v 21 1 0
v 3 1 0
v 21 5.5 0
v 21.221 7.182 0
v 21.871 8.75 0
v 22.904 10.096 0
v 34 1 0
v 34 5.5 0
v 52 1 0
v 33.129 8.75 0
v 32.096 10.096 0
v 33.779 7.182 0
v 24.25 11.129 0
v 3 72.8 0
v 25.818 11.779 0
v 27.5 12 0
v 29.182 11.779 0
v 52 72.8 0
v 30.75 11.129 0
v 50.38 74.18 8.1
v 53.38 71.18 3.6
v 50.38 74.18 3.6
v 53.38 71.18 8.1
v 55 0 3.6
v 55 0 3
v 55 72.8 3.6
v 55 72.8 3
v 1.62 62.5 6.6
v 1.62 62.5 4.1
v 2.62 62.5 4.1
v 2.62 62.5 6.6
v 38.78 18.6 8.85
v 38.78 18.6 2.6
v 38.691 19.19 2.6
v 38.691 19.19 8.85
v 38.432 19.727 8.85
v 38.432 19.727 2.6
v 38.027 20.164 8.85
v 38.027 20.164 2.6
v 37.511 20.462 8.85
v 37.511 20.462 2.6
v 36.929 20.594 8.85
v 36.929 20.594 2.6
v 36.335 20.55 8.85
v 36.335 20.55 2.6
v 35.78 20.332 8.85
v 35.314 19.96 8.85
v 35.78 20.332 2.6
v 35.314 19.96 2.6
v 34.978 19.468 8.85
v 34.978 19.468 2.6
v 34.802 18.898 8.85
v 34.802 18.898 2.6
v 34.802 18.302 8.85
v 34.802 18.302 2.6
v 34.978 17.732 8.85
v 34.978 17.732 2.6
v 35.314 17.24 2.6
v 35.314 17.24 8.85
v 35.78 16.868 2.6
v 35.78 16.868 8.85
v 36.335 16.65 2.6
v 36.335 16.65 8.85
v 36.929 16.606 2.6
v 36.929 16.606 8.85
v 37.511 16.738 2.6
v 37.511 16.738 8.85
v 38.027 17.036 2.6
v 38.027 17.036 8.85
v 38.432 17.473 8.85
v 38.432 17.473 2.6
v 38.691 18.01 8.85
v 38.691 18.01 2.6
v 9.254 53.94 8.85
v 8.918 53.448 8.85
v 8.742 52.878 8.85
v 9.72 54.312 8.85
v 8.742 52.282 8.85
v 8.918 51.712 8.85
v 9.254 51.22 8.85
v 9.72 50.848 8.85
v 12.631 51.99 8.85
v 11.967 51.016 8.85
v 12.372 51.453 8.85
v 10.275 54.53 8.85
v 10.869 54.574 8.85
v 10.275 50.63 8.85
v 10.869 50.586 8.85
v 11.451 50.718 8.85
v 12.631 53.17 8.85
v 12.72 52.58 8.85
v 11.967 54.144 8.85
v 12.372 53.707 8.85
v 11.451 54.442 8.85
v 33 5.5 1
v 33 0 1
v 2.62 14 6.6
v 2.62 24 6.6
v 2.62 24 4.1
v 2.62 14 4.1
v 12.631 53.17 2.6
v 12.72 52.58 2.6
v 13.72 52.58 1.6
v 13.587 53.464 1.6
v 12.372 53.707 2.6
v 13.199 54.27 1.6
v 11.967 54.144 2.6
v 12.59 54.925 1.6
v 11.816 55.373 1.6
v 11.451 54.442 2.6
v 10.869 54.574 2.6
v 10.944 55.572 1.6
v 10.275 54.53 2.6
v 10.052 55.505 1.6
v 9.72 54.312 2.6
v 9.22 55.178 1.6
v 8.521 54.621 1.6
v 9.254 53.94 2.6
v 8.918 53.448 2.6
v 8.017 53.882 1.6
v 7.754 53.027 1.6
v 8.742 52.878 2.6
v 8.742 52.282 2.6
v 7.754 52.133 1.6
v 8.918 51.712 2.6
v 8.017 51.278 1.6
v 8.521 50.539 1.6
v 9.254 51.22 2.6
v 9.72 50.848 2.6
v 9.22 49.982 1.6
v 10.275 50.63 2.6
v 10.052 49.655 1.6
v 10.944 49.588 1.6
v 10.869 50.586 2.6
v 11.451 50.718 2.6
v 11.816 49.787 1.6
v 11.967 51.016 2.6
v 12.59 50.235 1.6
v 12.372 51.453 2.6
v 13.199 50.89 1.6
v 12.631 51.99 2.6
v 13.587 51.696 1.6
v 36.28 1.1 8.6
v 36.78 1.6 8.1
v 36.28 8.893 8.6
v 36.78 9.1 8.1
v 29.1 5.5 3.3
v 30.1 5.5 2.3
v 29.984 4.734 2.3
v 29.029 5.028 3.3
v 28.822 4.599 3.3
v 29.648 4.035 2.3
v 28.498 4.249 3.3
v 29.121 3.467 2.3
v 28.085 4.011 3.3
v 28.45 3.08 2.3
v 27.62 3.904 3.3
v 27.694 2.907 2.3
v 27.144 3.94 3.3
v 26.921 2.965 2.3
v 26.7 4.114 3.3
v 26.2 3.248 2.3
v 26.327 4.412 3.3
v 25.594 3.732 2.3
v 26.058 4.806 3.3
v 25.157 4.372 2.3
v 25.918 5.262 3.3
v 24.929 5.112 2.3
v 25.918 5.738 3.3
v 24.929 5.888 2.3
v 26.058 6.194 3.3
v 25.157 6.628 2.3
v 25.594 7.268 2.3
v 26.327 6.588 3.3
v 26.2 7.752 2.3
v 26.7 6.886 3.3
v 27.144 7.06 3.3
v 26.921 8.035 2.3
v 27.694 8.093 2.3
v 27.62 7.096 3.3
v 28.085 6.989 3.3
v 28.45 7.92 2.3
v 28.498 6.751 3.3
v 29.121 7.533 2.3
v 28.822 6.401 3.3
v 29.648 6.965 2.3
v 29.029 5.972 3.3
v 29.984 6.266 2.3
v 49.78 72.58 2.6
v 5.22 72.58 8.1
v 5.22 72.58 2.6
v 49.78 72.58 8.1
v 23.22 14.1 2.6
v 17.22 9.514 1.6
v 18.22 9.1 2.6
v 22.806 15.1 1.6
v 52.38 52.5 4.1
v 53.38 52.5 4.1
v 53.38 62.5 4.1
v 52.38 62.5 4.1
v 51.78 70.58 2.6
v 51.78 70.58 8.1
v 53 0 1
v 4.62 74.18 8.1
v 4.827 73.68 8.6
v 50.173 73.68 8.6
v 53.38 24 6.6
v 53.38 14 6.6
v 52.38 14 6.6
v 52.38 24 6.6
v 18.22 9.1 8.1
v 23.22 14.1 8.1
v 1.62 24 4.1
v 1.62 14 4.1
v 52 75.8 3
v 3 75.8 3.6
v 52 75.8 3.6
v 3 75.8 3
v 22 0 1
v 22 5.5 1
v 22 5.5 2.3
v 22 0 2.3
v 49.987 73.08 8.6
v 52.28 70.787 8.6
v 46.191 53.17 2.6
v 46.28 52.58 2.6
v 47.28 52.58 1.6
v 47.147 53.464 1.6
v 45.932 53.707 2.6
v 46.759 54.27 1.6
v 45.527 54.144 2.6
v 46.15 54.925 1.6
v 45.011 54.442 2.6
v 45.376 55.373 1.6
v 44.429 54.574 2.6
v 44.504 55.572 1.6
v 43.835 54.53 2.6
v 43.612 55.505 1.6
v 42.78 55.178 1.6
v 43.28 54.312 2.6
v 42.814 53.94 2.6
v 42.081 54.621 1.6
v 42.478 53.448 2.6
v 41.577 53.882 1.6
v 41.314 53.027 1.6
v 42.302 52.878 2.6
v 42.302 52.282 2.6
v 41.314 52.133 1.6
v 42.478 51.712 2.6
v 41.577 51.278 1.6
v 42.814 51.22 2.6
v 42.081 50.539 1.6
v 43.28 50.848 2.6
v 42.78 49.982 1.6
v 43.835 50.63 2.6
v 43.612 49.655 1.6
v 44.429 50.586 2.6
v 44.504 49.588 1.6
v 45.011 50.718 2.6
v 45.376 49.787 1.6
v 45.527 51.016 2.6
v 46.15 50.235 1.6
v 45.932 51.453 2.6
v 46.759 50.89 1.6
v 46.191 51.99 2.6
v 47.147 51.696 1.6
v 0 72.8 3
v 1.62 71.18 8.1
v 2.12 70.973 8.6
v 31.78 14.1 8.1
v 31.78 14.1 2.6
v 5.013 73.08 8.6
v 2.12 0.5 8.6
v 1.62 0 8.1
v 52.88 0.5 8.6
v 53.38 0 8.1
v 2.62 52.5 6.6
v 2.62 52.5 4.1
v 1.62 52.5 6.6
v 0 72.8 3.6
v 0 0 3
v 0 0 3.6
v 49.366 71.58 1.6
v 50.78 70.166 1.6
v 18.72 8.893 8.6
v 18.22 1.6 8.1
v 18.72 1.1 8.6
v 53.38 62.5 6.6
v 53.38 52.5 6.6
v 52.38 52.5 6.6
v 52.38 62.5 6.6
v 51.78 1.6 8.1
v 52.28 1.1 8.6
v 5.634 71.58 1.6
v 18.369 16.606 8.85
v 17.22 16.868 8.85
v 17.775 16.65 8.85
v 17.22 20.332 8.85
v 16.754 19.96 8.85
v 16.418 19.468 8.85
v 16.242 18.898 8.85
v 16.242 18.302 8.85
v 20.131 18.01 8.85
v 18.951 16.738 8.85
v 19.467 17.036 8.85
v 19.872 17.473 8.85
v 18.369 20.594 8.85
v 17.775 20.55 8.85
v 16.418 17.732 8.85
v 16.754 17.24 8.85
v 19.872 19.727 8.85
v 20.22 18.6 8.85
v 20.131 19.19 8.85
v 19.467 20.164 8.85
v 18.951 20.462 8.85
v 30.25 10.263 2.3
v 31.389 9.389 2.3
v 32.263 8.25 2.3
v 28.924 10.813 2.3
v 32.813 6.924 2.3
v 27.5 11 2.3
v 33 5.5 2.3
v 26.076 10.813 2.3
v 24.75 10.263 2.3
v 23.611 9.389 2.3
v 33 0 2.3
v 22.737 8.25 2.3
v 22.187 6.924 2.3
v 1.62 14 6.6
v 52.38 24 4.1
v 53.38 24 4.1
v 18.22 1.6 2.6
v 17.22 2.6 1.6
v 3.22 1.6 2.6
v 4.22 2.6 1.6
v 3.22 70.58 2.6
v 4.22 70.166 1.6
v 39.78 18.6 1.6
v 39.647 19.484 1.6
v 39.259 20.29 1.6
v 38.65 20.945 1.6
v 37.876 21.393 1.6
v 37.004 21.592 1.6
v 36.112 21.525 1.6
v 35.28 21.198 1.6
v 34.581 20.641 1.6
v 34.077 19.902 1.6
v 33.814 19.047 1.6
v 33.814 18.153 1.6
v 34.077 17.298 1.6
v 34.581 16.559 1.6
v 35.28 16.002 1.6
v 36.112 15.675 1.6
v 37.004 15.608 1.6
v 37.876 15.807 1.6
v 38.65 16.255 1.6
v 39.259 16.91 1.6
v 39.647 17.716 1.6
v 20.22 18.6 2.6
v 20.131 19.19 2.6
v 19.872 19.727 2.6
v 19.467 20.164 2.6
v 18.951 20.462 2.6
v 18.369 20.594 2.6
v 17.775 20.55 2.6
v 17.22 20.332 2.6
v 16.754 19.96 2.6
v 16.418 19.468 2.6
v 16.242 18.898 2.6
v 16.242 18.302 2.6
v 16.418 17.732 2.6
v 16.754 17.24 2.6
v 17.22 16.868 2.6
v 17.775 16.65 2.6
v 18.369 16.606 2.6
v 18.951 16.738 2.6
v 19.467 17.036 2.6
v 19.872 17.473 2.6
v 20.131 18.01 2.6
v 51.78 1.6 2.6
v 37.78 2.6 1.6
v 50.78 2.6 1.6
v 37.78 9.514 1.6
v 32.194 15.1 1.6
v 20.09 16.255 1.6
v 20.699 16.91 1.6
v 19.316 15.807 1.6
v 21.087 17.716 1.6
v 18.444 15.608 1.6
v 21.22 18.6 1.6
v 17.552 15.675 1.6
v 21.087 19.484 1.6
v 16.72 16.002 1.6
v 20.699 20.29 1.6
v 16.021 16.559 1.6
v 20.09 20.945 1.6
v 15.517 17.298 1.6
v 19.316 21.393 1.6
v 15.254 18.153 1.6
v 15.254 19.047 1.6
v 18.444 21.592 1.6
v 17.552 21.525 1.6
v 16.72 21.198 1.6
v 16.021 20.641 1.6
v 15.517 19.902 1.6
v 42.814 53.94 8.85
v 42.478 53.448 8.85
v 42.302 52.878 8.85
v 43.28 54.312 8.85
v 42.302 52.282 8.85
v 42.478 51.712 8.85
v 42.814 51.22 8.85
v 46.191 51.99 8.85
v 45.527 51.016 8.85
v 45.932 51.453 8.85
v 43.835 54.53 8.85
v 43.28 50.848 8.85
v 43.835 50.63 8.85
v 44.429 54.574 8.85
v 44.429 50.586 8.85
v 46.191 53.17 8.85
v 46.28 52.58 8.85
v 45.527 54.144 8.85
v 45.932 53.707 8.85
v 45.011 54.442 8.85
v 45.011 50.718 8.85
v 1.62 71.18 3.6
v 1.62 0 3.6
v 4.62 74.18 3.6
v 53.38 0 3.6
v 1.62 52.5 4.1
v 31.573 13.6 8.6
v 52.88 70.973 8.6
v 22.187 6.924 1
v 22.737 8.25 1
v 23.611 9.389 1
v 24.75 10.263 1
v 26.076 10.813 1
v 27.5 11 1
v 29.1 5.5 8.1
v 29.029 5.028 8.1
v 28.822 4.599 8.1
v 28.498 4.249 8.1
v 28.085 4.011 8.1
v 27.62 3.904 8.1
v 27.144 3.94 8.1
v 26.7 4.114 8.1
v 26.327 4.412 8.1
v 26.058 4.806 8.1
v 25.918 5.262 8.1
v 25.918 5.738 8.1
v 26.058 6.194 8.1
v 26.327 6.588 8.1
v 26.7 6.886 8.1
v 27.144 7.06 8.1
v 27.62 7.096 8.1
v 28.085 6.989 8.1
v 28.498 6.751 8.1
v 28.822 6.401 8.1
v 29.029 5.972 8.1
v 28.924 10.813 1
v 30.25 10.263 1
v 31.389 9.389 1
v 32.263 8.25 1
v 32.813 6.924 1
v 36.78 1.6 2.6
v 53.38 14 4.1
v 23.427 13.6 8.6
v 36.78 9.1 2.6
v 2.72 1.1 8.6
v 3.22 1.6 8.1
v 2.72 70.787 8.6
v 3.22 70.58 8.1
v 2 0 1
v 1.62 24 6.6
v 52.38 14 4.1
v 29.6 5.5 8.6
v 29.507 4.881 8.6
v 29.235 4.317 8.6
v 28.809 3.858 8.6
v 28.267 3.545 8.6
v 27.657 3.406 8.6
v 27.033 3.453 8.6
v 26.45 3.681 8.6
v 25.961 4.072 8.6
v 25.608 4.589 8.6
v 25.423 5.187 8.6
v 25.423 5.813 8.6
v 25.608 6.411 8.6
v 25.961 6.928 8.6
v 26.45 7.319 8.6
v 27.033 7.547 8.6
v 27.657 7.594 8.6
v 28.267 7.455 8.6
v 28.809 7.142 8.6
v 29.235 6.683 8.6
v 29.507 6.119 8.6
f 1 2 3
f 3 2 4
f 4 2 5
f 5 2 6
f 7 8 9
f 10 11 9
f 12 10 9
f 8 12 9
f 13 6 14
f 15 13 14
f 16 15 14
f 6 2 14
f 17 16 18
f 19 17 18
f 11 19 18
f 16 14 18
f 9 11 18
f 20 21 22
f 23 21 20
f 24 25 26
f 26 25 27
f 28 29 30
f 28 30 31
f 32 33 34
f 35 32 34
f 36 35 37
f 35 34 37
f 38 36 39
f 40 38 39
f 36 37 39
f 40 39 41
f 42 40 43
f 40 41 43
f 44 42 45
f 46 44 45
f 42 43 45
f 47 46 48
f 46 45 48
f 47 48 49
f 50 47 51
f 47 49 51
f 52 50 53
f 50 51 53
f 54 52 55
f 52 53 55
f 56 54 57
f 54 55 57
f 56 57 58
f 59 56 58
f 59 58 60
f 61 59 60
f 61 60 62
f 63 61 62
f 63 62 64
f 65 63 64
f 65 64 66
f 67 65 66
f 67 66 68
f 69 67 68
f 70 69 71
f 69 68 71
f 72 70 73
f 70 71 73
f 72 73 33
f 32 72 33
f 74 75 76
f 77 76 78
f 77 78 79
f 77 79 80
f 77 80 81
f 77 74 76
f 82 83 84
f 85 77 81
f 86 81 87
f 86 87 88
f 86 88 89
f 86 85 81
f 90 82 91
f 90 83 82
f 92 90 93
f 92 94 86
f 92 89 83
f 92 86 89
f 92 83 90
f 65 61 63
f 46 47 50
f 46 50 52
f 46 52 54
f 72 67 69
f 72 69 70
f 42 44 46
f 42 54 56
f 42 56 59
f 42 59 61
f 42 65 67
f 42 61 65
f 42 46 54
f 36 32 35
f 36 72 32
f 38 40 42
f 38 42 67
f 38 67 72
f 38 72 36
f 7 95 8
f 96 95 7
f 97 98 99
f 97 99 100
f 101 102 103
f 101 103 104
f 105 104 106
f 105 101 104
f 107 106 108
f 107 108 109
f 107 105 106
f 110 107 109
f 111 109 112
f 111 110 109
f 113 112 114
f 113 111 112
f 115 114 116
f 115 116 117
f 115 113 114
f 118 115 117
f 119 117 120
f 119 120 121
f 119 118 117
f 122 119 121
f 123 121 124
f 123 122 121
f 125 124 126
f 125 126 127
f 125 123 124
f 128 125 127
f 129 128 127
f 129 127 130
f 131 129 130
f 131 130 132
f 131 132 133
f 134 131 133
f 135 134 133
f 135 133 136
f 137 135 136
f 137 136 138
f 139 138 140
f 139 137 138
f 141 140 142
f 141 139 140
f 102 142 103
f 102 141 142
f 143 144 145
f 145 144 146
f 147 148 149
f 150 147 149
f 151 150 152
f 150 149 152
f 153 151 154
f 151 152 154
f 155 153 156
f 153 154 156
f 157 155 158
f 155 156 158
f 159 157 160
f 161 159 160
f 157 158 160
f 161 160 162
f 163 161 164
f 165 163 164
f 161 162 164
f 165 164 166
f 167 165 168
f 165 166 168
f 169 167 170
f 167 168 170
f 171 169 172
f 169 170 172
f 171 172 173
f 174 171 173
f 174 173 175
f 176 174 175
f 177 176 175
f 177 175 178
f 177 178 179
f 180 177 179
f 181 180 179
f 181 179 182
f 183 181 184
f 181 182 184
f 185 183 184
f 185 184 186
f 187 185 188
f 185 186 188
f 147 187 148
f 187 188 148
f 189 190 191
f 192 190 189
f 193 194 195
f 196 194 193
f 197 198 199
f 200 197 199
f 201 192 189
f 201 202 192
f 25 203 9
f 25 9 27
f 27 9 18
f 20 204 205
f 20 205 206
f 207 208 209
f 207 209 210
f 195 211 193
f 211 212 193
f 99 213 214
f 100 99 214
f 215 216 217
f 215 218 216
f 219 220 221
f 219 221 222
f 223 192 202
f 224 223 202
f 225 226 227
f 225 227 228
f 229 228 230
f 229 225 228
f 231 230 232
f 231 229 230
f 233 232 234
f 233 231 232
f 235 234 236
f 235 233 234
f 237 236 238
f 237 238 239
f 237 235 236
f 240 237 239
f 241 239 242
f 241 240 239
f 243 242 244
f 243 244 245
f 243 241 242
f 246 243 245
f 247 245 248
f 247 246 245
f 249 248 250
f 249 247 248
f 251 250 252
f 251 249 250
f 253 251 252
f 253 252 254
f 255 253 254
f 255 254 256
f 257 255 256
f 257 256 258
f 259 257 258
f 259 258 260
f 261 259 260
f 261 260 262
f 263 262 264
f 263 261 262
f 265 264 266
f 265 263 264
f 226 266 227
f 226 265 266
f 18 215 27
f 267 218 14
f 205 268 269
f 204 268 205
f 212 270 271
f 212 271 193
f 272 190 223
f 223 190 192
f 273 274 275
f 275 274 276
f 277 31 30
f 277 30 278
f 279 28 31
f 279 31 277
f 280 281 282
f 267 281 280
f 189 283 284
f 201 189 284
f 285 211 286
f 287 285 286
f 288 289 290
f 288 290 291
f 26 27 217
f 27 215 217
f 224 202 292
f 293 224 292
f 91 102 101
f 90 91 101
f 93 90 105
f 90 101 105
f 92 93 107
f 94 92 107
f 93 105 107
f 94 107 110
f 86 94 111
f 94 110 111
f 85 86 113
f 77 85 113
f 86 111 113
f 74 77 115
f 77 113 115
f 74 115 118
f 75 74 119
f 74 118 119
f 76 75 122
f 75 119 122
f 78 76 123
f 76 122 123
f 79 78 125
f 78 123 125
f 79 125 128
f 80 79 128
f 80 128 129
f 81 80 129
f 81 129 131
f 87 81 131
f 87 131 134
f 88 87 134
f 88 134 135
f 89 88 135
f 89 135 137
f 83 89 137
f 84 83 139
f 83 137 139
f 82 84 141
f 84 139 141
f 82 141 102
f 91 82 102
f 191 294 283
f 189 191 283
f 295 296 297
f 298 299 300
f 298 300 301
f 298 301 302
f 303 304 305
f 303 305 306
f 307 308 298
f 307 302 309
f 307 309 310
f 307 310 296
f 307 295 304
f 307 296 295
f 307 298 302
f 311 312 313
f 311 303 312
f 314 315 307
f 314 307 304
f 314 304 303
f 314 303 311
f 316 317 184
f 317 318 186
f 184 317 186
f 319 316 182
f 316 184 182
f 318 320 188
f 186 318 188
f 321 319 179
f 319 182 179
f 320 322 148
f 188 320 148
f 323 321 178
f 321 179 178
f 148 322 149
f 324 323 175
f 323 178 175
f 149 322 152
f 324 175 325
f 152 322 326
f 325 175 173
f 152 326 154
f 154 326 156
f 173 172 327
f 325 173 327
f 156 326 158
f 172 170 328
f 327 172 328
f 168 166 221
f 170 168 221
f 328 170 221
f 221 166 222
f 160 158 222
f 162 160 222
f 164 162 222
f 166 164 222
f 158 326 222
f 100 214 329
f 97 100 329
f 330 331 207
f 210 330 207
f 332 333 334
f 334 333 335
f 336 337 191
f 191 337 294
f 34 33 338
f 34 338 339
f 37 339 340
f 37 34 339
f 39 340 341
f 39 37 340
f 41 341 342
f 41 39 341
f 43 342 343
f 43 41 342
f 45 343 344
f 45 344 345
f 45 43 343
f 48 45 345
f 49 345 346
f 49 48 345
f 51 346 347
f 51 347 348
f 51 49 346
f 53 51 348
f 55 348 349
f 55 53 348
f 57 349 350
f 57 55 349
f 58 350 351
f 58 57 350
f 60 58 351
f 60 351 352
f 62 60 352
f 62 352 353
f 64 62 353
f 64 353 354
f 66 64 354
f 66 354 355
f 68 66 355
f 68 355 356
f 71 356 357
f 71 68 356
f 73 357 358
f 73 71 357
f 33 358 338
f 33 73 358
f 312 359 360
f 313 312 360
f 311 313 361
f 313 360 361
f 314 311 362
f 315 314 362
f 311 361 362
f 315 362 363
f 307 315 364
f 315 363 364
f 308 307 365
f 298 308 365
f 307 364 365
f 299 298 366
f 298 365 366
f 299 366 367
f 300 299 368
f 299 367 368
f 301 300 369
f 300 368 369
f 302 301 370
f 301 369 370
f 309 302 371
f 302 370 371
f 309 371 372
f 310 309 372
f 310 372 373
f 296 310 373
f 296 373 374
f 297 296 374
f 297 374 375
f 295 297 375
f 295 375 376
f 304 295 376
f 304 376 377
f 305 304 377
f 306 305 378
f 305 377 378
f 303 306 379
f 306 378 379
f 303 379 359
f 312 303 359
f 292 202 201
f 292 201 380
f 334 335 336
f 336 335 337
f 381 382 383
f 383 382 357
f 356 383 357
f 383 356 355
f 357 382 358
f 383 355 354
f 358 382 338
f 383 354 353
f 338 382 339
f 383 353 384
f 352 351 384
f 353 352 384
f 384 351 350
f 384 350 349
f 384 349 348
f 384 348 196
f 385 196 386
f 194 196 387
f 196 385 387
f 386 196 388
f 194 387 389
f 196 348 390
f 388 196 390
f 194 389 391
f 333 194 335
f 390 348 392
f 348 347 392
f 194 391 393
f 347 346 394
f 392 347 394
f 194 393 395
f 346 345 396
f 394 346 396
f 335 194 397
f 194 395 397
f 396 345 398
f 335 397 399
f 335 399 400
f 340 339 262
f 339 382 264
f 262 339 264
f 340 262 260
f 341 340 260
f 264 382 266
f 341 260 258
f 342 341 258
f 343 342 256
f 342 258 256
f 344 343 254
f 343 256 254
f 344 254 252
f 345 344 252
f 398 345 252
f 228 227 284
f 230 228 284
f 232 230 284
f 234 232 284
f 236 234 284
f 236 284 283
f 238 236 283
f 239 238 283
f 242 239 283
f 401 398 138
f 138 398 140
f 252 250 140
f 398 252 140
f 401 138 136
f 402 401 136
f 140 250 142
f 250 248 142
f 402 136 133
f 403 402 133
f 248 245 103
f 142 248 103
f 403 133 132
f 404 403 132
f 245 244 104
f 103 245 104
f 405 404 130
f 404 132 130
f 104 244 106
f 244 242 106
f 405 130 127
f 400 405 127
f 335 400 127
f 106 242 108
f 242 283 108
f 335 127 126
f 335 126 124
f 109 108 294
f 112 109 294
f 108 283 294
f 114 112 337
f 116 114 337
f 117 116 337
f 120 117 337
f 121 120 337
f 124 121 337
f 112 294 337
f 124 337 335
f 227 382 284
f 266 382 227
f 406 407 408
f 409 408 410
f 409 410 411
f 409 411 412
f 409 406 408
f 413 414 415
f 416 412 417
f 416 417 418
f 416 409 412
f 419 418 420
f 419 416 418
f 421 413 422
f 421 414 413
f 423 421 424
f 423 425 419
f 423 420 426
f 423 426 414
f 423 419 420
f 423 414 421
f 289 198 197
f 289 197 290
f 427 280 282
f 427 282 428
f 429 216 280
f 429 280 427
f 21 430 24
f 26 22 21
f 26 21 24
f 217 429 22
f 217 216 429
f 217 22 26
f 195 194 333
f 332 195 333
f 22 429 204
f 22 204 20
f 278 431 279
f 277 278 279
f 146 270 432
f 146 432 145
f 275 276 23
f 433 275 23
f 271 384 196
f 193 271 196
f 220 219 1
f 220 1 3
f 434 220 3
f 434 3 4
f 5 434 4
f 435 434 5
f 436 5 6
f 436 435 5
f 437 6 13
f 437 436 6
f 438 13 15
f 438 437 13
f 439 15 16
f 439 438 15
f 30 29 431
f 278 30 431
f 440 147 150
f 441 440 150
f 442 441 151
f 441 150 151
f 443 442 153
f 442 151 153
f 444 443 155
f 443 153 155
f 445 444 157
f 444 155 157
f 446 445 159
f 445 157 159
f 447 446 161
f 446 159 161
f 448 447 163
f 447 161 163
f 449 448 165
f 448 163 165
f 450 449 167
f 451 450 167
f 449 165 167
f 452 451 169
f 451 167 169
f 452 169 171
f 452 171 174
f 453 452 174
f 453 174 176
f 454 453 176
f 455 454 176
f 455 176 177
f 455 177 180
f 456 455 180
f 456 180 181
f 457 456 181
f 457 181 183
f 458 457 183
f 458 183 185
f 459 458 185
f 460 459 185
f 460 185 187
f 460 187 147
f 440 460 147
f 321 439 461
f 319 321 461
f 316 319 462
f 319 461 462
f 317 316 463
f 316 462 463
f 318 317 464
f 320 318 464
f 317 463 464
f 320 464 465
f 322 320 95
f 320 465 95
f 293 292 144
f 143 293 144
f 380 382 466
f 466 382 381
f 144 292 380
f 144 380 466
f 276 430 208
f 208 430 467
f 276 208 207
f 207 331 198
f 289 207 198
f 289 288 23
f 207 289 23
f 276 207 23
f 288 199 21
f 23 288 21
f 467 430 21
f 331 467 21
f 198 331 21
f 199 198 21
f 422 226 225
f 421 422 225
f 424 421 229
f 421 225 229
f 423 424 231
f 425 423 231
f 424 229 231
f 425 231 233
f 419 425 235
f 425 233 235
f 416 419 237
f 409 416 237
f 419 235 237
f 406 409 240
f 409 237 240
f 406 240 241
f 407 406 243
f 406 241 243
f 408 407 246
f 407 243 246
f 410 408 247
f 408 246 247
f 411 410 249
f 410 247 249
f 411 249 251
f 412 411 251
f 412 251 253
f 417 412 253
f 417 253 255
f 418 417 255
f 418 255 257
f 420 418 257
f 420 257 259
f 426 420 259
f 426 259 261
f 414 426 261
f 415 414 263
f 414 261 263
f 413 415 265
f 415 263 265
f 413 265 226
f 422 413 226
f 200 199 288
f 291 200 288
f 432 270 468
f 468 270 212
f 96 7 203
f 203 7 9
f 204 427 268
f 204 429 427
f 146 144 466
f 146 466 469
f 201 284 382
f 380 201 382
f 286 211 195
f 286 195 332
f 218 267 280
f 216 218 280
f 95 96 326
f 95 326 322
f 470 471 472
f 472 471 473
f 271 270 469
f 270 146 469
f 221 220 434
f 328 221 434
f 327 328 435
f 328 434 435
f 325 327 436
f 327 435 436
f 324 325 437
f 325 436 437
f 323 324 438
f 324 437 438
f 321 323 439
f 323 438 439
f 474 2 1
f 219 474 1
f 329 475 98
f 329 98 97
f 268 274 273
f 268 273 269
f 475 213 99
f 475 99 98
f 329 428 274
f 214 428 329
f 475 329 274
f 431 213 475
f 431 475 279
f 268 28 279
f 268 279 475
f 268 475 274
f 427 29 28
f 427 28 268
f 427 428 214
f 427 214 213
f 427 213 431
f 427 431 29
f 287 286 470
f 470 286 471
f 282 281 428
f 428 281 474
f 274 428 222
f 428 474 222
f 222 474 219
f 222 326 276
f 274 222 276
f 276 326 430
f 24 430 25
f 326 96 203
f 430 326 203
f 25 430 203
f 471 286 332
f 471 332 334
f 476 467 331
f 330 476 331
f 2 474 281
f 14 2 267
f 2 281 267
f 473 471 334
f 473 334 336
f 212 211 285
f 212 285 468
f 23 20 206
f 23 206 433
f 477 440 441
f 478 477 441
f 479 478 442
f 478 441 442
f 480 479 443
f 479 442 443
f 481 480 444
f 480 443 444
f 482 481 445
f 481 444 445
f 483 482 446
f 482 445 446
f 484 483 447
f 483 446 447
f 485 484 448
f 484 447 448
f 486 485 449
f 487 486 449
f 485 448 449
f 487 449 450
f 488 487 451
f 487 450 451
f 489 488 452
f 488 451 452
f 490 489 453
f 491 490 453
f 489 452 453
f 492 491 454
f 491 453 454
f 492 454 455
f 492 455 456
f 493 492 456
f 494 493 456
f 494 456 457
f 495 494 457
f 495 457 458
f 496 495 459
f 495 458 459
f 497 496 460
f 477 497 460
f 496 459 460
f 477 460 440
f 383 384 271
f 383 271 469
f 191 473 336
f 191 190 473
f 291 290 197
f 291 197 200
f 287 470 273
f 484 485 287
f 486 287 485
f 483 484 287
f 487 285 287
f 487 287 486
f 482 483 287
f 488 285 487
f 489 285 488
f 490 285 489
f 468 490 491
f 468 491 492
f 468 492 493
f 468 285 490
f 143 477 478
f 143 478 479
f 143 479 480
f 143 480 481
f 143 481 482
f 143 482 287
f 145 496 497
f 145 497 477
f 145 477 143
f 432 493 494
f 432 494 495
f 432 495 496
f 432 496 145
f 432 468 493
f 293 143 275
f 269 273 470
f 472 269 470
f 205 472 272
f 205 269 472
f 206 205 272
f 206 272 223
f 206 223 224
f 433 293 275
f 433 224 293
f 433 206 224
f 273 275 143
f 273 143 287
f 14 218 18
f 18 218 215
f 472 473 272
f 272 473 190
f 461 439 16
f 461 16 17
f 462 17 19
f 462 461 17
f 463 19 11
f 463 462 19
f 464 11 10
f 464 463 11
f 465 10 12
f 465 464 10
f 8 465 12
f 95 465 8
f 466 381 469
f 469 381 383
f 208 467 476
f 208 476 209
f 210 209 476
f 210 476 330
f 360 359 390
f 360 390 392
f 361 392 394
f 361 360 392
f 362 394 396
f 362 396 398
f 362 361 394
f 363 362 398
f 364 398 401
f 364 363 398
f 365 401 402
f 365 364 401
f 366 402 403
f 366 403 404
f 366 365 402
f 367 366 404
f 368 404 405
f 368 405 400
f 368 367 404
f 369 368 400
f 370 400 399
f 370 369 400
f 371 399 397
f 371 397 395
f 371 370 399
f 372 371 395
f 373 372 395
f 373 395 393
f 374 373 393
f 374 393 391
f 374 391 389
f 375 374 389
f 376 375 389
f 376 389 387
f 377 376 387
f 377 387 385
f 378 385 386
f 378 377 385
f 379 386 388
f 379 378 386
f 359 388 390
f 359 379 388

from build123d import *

# Parameters (mm, degrees)
SKETCH_W        = 55
SKETCH_H        = 75.8
PAD_DEPTH       = 3.6
SKETCH001_W     = 51.76
SKETCH001_H     = 74.18
PAD001_DEPTH    = 5
POCKET_DEPTH    = 7
SKETCH003_R     = 2
PAD002_DEPTH    = 7.25
SKETCH004_W     = 10
SKETCH004_H     = 2.5
POCKET001_DEPTH = 1
SKETCH005_W     = 10
SKETCH005_H     = 2.5
POCKET002_DEPTH = 1
POCKET003_DEPTH = 2.3
SKETCH007_R     = 1.6
POCKET004_DEPTH = 6.551
CHAMFER_SIZE    = 5
CHAMFER001_SIZE = 2
CHAMFER002_SIZE = 1
CHAMFER003_SIZE = 3
CHAMFER004_SIZE = 0.5
CHAMFER005_SIZE = 1
CHAMFER006_SIZE = 3
CHAMFER007_SIZE = 1
CHAMFER008_SIZE = 1


with BuildPart() as part:
    # Sketch → Pad (new body)
    with BuildSketch(Plane.XY):
        with Locations((27.5, 37.9)):
            Rectangle(SKETCH_W, SKETCH_H)
    extrude(amount=PAD_DEPTH)

    # Sketch001 → Pad001 (new body)
    with BuildSketch(Plane.XY.offset(3.6)):
        with Locations((27.5, 37.09)):
            Rectangle(SKETCH001_W, SKETCH001_H)
    extrude(amount=PAD001_DEPTH)

    # Sketch002 → Pocket (cut)
    with BuildSketch(Plane.XY.offset(8.6)):
        Polygon((18.22, 1.6), (3.22, 1.6), (3.22, 72.58), (51.78, 72.58), (51.78, 1.6), (36.78, 1.6), (36.78, 14.1), (18.22, 14.1), align=None)
    extrude(amount=-POCKET_DEPTH, mode=Mode.SUBTRACT)

    # Sketch003 → Pad002 (new body)
    with BuildSketch(Plane.XY.offset(1.6)):
        with Locations((10.72, 52.58)):
            Circle(SKETCH003_R)
        with Locations((44.28, 52.58)):
            Circle(SKETCH003_R)
        with Locations((18.22, 18.6)):
            Circle(SKETCH003_R)
        with Locations((36.78, 18.6)):
            Circle(SKETCH003_R)
    extrude(amount=PAD002_DEPTH)

    # Sketch004 → Pocket001 (cut)
    with BuildSketch(Plane.YZ.offset(53.38)):
        with Locations((19, 5.35)):
            Rectangle(SKETCH004_W, SKETCH004_H)
        with Locations((57.5, 5.35)):
            Rectangle(SKETCH004_W, SKETCH004_H)
    extrude(amount=-POCKET001_DEPTH, mode=Mode.SUBTRACT)

    # Sketch005 → Pocket002 (cut)
    with BuildSketch(Plane(origin=(1.62, 0, 0), x_dir=(0, -1, 0), z_dir=(-1, 0, 0))):
        with Locations((-57.5, 5.35)):
            Rectangle(SKETCH005_W, SKETCH005_H)
        with Locations((-19, 5.35)):
            Rectangle(SKETCH005_W, SKETCH005_H)
    extrude(amount=-POCKET002_DEPTH, mode=Mode.SUBTRACT)

    # Sketch006 → Pocket003 (cut)
    with BuildSketch(Plane(origin=(0, 0, 0), x_dir=(1, 0, 0), z_dir=(0, 0, -1))):
        with BuildLine():
            Line((22, 0), (33, 0))
            Line((33, 0), (33, -5.500002))
            ThreePointArc((27.500001, -11), (31.389087, -9.389088), (33, -5.500002))
            Line((27.500001, -11), (27.499999, -11))
            ThreePointArc((22, -5.500002), (23.610913, -9.389088), (27.499999, -11))
            Line((22, -5.500002), (22, 0))
        make_face()
    extrude(amount=-POCKET003_DEPTH, mode=Mode.SUBTRACT)

    # Sketch007 → Pocket004 (cut, through all)
    with BuildSketch(Plane(origin=(0, 0, 2.3), x_dir=(1, 0, 0), z_dir=(0, 0, -1))):
        with Locations((27.5, -5.5)):
            Circle(SKETCH007_R)
    extrude(amount=-POCKET004_DEPTH, mode=Mode.SUBTRACT)

    # Chamfer
    chamfer_edges = [part.edges().sort_by_distance(p)[0] for p in [
        (18.22, 14.1, 5.1),
        (36.78, 14.1, 5.1),
    ]]
    chamfer(chamfer_edges, length=CHAMFER_SIZE)

    # Chamfer001
    chamfer001_edges = [part.edges().sort_by_distance(p)[0] for p in [
        (3.22, 72.58, 5.1),
        (51.78, 72.58, 5.1),
    ]]
    chamfer(chamfer001_edges, length=CHAMFER001_SIZE)

    # Chamfer002
    chamfer002_edges = [part.edges().sort_by_distance(p)[0] for p in [
        (3.22, 36.09, 1.6),
        (4.22, 71.58, 1.6),
        (10.72, 1.6, 1.6),
        (27.5, 72.58, 1.6),
        (18.22, 5.35, 1.6),
        (50.78, 71.58, 1.6),
        (20.72, 11.6, 1.6),
        (51.78, 36.09, 1.6),
        (27.5, 14.1, 1.6),
        (44.28, 1.6, 1.6),
        (34.28, 11.6, 1.6),
        (36.78, 5.35, 1.6),
        (8.72, 52.58, 1.6),
        (42.28, 52.58, 1.6),
        (34.78, 18.6, 1.6),
        (16.22, 18.6, 1.6),
    ]]
    chamfer(chamfer002_edges, length=CHAMFER002_SIZE)

    # Chamfer003
    chamfer003_edges = [part.edges().sort_by_distance(p)[0] for p in [
        (53.38, 74.18, 6.1),
        (1.62, 74.18, 6.1),
    ]]
    chamfer(chamfer003_edges, length=CHAMFER003_SIZE)

    # Chamfer004
    chamfer004_edges = [part.edges().sort_by_distance(p)[0] for p in [
        (1.62, 35.59, 8.6),
        (3.12, 72.68, 8.6),
        (27.5, 0, 8.6),
        (27.5, 74.18, 8.6),
        (53.38, 35.59, 8.6),
        (51.88, 72.68, 8.6),
        (51.78, 36.09, 8.6),
        (50.78, 71.58, 8.6),
        (44.28, 1.6, 8.6),
        (27.5, 72.58, 8.6),
        (36.78, 5.35, 8.6),
        (4.22, 71.58, 8.6),
        (34.28, 11.6, 8.6),
        (3.22, 36.09, 8.6),
        (27.5, 14.1, 8.6),
        (10.72, 1.6, 8.6),
        (20.72, 11.6, 8.6),
        (18.22, 5.35, 8.6),
        (25.9, 5.5, 8.6),
    ]]
    chamfer(chamfer004_edges, length=CHAMFER004_SIZE)

    # Chamfer005
    chamfer005_edges = [part.edges().sort_by_distance(p)[0] for p in [
        (25.9, 5.5, 2.3),
    ]]
    chamfer(chamfer005_edges, length=CHAMFER005_SIZE)

    # Chamfer006
    chamfer006_edges = [part.edges().sort_by_distance(p)[0] for p in [
        (0, 75.8, 1.8),
        (55, 75.8, 1.8),
        (27.5, 75.8, 0),
        (55, 37.9, 0),
        (0, 37.9, 0),
    ]]
    chamfer(chamfer006_edges, length=CHAMFER006_SIZE)

    # Chamfer007
    chamfer007_edges = [part.edges().sort_by_distance(p)[0] for p in [
        (12.5, 0, 0),
        (42.5, 0, 0),
    ]]
    chamfer(chamfer007_edges, length=CHAMFER007_SIZE)

    # Chamfer008
    chamfer008_edges = [part.edges().sort_by_distance(p)[0] for p in [
        (23.610913, 9.389088, 0),
    ]]
    chamfer(chamfer008_edges, length=CHAMFER008_SIZE)


solid = part.part
